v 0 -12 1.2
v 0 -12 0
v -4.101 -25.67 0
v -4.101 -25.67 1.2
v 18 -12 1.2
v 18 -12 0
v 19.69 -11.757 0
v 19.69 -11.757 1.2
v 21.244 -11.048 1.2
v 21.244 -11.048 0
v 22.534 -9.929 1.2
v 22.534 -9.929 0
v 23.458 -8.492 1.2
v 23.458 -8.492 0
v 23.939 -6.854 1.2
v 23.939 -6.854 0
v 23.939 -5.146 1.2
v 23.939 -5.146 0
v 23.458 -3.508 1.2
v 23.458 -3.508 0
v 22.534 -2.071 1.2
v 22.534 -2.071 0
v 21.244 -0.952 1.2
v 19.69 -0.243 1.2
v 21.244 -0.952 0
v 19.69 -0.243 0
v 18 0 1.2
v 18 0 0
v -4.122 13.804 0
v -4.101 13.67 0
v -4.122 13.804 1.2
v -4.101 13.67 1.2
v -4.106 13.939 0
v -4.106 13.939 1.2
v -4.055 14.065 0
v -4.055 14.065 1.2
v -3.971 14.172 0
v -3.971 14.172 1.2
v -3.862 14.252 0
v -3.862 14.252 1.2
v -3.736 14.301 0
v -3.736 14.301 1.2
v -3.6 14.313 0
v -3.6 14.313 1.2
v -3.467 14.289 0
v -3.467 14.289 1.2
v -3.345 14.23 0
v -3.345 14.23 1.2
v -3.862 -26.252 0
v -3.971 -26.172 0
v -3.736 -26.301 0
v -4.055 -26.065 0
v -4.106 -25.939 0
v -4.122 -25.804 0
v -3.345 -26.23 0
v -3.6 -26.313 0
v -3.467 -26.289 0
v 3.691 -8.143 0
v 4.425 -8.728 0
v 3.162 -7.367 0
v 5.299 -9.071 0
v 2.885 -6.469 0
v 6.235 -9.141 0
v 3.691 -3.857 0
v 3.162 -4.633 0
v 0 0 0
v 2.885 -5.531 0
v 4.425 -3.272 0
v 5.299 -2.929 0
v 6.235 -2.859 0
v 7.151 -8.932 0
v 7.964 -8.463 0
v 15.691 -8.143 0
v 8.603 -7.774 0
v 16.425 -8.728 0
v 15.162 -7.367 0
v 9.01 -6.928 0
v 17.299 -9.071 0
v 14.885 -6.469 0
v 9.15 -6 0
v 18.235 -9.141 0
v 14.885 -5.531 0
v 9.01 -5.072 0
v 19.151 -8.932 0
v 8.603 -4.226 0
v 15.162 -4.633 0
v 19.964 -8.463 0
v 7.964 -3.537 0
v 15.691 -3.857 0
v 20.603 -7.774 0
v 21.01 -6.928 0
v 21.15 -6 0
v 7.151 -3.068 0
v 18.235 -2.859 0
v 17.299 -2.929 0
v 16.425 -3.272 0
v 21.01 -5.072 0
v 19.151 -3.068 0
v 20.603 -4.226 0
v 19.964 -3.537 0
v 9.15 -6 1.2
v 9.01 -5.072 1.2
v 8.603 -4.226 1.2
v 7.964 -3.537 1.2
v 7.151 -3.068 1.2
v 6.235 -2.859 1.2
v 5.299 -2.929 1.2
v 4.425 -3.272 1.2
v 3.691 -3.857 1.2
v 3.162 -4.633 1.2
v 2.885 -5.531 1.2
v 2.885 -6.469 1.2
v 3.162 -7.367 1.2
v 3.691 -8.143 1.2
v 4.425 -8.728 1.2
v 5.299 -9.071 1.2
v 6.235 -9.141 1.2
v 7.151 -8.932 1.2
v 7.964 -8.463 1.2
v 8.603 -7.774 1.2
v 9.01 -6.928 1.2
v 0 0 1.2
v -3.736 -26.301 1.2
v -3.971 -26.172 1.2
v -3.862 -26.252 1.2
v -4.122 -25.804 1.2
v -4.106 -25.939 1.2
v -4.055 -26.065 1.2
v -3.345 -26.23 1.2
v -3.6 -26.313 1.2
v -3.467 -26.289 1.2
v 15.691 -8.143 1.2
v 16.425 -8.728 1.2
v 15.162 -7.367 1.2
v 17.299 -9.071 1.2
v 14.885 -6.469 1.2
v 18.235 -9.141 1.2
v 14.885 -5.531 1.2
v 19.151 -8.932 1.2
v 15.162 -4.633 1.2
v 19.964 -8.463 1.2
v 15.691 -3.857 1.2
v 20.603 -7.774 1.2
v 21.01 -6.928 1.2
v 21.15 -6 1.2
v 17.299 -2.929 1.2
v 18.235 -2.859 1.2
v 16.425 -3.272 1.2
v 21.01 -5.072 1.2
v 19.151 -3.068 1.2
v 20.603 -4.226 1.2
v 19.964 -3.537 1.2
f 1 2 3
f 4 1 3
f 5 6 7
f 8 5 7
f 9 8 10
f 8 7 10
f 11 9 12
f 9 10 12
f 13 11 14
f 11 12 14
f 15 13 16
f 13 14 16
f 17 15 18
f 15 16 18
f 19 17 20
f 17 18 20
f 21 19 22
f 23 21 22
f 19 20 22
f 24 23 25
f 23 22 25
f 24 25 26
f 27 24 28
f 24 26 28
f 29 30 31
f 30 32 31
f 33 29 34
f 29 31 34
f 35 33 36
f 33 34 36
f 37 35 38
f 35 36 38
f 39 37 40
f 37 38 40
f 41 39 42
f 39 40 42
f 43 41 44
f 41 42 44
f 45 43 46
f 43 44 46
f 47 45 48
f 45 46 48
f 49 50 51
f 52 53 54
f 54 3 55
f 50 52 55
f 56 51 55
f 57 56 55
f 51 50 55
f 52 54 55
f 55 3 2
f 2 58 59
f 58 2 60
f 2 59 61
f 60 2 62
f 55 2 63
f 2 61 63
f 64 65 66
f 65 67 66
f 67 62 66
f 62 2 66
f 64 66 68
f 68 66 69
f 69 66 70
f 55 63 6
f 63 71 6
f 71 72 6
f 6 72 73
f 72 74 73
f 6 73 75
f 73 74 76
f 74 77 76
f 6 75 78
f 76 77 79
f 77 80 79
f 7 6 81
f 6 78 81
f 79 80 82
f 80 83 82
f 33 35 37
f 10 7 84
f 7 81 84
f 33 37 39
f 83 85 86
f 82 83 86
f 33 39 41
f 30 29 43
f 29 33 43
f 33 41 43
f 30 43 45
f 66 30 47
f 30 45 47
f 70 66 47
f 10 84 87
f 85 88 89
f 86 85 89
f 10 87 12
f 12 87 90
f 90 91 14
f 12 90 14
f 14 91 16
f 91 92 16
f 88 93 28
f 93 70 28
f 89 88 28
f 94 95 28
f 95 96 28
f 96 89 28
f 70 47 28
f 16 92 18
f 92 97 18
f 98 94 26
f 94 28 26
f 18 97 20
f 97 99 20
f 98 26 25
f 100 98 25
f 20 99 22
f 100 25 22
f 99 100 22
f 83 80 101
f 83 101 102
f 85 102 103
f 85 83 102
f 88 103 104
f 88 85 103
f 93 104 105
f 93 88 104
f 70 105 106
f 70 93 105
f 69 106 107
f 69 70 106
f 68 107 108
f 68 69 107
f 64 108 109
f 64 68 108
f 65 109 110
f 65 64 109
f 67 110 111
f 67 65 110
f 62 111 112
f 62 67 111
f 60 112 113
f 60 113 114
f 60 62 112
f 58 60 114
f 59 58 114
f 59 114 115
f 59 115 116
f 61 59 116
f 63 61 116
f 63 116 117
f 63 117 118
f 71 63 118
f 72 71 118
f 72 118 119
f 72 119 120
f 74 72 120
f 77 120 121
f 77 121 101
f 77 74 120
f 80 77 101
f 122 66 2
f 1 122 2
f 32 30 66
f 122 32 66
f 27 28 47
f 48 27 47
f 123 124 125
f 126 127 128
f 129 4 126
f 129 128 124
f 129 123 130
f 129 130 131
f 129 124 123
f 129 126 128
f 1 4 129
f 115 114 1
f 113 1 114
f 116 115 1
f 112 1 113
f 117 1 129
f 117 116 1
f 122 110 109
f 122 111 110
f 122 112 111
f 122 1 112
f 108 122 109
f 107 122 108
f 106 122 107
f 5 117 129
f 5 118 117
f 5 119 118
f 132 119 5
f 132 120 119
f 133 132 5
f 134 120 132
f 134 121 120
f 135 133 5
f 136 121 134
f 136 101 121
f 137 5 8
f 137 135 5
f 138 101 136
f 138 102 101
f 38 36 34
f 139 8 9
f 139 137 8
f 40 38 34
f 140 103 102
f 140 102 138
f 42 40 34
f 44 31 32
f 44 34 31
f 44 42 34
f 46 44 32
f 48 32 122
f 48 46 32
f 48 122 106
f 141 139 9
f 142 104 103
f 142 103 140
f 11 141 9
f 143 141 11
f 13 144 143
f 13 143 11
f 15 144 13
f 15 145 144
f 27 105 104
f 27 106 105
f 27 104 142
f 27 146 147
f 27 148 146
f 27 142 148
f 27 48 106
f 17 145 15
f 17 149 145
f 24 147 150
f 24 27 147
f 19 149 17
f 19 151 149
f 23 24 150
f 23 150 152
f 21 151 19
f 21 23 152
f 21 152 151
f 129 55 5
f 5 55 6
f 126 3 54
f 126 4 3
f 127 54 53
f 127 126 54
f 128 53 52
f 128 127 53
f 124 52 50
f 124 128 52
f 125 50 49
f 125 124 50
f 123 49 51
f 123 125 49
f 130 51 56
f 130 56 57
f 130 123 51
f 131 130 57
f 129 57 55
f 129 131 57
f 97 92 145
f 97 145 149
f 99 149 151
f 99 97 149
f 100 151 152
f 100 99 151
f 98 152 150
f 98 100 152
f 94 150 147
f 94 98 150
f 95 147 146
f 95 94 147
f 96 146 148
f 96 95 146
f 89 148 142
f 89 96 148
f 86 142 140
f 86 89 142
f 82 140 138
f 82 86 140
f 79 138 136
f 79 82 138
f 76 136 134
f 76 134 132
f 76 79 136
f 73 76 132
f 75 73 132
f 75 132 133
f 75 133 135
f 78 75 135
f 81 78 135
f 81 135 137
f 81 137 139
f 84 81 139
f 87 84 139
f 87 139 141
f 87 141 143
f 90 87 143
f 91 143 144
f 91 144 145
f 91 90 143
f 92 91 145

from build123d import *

# Parameters (mm, degrees)
F0_R     = 3.15
F1_DEPTH = 1.2
F2_R     = 0.5


with BuildPart() as f1:
    # F0 (on Top) → F1 (new body)
    with BuildSketch(Plane.XY):
        Polygon((-4.5, 15), (0, 0), (18, 0), align=None)
        with BuildLine():
            Line((18, 0), (0, 0))
            Line((0, 0), (0, -12))
            Line((0, -12), (18, -12))
            ThreePointArc((18, -12), (24, -6), (18, 0))
        make_face()
        with Locations((6, -6)):
            Circle(F0_R, mode=Mode.SUBTRACT)
        with Locations((18, -6)):
            Circle(F0_R, mode=Mode.SUBTRACT)
        Polygon((18, -12), (0, -12), (-4.5, -27), align=None)
    extrude(amount=F1_DEPTH)

    # F2
    f2_edges = [f1.edges().sort_by_distance(p)[0] for p in [
        (-4.5, -27, 0.6),
        (-4.5, 15, 0.6),
    ]]
    fillet(f2_edges, radius=F2_R)


solid = f1.part
